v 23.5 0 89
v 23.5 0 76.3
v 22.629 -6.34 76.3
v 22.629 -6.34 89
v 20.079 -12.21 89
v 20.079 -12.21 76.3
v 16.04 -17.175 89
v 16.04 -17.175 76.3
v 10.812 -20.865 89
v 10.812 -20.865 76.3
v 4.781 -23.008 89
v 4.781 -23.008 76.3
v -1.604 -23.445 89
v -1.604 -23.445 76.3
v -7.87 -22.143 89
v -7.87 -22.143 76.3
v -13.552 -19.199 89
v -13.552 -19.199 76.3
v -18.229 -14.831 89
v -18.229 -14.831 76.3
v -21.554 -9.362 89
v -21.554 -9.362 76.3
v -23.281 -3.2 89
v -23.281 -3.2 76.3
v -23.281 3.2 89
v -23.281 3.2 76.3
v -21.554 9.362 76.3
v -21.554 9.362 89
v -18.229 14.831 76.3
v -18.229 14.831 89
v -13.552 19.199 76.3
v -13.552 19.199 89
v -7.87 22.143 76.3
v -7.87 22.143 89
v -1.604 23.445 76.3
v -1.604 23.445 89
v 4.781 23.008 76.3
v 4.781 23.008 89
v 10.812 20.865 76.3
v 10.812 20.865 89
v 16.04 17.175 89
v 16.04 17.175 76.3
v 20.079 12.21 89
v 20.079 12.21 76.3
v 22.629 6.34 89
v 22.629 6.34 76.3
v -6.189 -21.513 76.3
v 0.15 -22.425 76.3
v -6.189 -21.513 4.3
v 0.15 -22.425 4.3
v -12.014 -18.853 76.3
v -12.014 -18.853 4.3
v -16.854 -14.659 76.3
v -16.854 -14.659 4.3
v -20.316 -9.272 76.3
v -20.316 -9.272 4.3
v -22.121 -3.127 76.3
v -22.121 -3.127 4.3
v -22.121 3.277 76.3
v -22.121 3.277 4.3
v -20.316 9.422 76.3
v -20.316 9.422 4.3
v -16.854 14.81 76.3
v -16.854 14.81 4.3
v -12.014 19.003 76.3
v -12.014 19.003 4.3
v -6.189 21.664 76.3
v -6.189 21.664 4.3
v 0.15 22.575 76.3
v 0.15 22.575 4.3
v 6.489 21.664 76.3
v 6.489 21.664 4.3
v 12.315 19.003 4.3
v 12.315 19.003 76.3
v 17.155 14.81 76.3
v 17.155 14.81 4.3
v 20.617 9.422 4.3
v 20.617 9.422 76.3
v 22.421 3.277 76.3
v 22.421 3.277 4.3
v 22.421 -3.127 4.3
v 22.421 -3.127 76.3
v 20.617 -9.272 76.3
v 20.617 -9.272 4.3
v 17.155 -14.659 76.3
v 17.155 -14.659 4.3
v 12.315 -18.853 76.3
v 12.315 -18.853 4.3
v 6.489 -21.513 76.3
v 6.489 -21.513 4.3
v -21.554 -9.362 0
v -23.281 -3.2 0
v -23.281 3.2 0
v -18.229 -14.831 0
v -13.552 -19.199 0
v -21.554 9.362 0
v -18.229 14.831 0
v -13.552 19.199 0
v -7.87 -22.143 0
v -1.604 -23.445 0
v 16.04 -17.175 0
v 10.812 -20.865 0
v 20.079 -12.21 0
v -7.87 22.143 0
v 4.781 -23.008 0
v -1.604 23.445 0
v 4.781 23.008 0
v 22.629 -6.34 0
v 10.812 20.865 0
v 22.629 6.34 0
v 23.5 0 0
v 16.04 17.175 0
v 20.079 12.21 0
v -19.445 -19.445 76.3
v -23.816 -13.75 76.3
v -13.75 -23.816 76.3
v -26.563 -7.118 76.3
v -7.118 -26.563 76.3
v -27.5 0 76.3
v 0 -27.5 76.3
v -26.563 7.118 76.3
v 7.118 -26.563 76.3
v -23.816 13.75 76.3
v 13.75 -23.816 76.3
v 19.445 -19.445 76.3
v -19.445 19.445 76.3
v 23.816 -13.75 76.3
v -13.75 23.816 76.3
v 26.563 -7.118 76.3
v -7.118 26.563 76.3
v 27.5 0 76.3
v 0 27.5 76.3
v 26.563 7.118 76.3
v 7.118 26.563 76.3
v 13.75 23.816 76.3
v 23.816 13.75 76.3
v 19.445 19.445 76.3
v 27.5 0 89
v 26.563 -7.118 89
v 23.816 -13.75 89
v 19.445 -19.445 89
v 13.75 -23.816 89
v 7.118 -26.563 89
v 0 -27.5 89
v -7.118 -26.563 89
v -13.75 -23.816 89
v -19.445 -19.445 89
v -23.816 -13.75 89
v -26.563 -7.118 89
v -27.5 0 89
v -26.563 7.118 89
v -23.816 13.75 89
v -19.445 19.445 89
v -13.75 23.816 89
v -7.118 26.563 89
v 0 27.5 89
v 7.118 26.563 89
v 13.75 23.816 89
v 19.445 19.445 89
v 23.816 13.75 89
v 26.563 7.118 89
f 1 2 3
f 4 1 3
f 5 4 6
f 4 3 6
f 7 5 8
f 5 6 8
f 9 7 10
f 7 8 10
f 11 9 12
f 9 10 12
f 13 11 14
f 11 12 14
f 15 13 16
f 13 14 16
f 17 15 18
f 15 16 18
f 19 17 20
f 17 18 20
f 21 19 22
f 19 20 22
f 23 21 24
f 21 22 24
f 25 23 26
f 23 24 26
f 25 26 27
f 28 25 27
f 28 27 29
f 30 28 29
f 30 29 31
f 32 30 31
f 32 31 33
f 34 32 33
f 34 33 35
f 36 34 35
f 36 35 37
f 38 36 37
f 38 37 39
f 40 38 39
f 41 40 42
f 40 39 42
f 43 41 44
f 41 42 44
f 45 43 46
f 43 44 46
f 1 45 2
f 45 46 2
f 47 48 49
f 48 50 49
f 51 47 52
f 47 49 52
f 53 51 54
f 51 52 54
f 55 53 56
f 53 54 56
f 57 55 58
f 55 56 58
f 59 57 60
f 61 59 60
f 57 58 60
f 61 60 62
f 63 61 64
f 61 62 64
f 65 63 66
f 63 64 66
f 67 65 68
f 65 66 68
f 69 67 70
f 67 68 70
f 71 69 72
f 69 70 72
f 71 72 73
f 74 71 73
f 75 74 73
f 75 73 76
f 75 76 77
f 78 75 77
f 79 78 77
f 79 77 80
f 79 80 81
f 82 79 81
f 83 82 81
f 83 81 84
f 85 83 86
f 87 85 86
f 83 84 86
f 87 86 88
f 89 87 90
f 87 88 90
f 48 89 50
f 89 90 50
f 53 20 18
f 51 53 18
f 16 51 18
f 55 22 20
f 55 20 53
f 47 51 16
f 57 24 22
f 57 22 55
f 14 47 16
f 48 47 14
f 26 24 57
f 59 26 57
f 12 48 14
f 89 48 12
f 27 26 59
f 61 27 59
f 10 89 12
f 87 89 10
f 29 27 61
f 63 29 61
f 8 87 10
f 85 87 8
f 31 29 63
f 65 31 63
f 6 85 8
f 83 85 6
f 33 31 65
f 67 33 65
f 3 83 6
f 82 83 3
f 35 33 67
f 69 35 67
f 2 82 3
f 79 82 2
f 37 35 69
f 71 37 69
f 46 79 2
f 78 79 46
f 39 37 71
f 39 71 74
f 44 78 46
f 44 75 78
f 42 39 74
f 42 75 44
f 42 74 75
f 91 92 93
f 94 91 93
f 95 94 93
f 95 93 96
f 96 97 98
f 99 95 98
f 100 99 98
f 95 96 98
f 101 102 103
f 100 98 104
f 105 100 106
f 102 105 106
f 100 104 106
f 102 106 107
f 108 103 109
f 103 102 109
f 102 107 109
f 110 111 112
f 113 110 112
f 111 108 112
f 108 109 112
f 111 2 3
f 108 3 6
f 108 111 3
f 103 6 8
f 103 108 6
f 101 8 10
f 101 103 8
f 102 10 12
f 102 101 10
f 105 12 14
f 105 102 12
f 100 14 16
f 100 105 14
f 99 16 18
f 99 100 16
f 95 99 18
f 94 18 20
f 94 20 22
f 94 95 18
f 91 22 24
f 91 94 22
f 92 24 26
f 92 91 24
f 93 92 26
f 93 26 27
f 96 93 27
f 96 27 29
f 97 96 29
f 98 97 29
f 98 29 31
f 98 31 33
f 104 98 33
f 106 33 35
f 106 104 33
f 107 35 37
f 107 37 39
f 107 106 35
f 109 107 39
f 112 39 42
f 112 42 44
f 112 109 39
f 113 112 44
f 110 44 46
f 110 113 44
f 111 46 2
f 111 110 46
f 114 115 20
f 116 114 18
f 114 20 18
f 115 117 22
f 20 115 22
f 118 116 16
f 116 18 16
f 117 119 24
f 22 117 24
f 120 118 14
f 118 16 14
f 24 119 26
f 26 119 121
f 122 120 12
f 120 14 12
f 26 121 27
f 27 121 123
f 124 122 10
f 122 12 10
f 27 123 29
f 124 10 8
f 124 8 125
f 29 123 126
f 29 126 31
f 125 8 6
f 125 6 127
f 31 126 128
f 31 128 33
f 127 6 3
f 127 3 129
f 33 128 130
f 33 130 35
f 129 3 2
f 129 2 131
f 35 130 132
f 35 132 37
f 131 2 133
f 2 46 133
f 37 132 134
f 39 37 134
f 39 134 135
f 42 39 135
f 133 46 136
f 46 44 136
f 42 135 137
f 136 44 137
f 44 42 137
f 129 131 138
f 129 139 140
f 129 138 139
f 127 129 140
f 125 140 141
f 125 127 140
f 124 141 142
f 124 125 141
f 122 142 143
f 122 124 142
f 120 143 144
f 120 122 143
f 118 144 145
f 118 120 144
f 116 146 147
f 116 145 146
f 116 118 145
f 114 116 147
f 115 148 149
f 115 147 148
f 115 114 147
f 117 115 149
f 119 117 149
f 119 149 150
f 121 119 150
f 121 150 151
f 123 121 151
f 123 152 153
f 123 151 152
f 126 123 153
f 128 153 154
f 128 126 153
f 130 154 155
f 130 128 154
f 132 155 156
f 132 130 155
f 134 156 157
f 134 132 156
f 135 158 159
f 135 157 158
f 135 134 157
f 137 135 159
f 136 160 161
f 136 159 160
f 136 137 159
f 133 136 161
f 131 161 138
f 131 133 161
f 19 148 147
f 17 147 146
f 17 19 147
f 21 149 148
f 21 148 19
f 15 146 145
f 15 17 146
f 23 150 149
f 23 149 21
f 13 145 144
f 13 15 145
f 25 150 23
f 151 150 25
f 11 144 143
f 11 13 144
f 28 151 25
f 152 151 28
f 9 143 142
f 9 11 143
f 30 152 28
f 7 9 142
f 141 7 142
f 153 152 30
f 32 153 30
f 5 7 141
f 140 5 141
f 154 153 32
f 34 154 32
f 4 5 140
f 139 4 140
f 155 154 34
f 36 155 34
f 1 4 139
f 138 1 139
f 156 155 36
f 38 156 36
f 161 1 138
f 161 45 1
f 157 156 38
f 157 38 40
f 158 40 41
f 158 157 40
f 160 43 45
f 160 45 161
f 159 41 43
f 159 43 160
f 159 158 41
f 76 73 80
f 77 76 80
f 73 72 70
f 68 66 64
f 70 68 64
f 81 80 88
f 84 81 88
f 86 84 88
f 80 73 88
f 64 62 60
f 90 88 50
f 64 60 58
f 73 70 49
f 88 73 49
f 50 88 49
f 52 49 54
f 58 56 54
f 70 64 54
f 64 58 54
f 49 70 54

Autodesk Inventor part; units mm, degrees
ref_plane "YZ Plane" through (0, 0, 0) normal (1, 0, 0) x (0, 1, 0)
ref_plane "XZ Plane" through (0, 0, 0) normal (0, 1, 0) x (-1, 0, 0)
ref_plane "XY Plane" through (0, 0, 0) normal (0, 0, 1) x (1, 0, 0)
sketch "Sketch1" plane through (0, 0, 0) normal (0, 0, 1) x (1, 0, 0)
  line L0 (-32.9, 0) -> (32.9, 0) projected
  line L1 (0, -32.9) -> (0, 32.9) projected
  circle A0 centre (0, 0) radius 23.5
  dimension "d0" = 47
extrude "Extrusion1" add sketch "Sketch1" along normal blind 76.3
sketch "Sketch2" plane through (0, 0, 76.3) normal (0, 0, 1) x (1, 0, 0)
  circle A0 centre (0, 0) radius 23.5 projected
  circle A1 centre (0, 0) radius 27.5
  dimension "d3" = 55
extrude "Extrusion2" add sketch "Sketch2" along normal blind 12.7
hole "Hole1" at (0.1504, 0.0752, 76.3) direction (0, 0, -1) diameter 45 depth 72
properties part number "Outter Cup"
